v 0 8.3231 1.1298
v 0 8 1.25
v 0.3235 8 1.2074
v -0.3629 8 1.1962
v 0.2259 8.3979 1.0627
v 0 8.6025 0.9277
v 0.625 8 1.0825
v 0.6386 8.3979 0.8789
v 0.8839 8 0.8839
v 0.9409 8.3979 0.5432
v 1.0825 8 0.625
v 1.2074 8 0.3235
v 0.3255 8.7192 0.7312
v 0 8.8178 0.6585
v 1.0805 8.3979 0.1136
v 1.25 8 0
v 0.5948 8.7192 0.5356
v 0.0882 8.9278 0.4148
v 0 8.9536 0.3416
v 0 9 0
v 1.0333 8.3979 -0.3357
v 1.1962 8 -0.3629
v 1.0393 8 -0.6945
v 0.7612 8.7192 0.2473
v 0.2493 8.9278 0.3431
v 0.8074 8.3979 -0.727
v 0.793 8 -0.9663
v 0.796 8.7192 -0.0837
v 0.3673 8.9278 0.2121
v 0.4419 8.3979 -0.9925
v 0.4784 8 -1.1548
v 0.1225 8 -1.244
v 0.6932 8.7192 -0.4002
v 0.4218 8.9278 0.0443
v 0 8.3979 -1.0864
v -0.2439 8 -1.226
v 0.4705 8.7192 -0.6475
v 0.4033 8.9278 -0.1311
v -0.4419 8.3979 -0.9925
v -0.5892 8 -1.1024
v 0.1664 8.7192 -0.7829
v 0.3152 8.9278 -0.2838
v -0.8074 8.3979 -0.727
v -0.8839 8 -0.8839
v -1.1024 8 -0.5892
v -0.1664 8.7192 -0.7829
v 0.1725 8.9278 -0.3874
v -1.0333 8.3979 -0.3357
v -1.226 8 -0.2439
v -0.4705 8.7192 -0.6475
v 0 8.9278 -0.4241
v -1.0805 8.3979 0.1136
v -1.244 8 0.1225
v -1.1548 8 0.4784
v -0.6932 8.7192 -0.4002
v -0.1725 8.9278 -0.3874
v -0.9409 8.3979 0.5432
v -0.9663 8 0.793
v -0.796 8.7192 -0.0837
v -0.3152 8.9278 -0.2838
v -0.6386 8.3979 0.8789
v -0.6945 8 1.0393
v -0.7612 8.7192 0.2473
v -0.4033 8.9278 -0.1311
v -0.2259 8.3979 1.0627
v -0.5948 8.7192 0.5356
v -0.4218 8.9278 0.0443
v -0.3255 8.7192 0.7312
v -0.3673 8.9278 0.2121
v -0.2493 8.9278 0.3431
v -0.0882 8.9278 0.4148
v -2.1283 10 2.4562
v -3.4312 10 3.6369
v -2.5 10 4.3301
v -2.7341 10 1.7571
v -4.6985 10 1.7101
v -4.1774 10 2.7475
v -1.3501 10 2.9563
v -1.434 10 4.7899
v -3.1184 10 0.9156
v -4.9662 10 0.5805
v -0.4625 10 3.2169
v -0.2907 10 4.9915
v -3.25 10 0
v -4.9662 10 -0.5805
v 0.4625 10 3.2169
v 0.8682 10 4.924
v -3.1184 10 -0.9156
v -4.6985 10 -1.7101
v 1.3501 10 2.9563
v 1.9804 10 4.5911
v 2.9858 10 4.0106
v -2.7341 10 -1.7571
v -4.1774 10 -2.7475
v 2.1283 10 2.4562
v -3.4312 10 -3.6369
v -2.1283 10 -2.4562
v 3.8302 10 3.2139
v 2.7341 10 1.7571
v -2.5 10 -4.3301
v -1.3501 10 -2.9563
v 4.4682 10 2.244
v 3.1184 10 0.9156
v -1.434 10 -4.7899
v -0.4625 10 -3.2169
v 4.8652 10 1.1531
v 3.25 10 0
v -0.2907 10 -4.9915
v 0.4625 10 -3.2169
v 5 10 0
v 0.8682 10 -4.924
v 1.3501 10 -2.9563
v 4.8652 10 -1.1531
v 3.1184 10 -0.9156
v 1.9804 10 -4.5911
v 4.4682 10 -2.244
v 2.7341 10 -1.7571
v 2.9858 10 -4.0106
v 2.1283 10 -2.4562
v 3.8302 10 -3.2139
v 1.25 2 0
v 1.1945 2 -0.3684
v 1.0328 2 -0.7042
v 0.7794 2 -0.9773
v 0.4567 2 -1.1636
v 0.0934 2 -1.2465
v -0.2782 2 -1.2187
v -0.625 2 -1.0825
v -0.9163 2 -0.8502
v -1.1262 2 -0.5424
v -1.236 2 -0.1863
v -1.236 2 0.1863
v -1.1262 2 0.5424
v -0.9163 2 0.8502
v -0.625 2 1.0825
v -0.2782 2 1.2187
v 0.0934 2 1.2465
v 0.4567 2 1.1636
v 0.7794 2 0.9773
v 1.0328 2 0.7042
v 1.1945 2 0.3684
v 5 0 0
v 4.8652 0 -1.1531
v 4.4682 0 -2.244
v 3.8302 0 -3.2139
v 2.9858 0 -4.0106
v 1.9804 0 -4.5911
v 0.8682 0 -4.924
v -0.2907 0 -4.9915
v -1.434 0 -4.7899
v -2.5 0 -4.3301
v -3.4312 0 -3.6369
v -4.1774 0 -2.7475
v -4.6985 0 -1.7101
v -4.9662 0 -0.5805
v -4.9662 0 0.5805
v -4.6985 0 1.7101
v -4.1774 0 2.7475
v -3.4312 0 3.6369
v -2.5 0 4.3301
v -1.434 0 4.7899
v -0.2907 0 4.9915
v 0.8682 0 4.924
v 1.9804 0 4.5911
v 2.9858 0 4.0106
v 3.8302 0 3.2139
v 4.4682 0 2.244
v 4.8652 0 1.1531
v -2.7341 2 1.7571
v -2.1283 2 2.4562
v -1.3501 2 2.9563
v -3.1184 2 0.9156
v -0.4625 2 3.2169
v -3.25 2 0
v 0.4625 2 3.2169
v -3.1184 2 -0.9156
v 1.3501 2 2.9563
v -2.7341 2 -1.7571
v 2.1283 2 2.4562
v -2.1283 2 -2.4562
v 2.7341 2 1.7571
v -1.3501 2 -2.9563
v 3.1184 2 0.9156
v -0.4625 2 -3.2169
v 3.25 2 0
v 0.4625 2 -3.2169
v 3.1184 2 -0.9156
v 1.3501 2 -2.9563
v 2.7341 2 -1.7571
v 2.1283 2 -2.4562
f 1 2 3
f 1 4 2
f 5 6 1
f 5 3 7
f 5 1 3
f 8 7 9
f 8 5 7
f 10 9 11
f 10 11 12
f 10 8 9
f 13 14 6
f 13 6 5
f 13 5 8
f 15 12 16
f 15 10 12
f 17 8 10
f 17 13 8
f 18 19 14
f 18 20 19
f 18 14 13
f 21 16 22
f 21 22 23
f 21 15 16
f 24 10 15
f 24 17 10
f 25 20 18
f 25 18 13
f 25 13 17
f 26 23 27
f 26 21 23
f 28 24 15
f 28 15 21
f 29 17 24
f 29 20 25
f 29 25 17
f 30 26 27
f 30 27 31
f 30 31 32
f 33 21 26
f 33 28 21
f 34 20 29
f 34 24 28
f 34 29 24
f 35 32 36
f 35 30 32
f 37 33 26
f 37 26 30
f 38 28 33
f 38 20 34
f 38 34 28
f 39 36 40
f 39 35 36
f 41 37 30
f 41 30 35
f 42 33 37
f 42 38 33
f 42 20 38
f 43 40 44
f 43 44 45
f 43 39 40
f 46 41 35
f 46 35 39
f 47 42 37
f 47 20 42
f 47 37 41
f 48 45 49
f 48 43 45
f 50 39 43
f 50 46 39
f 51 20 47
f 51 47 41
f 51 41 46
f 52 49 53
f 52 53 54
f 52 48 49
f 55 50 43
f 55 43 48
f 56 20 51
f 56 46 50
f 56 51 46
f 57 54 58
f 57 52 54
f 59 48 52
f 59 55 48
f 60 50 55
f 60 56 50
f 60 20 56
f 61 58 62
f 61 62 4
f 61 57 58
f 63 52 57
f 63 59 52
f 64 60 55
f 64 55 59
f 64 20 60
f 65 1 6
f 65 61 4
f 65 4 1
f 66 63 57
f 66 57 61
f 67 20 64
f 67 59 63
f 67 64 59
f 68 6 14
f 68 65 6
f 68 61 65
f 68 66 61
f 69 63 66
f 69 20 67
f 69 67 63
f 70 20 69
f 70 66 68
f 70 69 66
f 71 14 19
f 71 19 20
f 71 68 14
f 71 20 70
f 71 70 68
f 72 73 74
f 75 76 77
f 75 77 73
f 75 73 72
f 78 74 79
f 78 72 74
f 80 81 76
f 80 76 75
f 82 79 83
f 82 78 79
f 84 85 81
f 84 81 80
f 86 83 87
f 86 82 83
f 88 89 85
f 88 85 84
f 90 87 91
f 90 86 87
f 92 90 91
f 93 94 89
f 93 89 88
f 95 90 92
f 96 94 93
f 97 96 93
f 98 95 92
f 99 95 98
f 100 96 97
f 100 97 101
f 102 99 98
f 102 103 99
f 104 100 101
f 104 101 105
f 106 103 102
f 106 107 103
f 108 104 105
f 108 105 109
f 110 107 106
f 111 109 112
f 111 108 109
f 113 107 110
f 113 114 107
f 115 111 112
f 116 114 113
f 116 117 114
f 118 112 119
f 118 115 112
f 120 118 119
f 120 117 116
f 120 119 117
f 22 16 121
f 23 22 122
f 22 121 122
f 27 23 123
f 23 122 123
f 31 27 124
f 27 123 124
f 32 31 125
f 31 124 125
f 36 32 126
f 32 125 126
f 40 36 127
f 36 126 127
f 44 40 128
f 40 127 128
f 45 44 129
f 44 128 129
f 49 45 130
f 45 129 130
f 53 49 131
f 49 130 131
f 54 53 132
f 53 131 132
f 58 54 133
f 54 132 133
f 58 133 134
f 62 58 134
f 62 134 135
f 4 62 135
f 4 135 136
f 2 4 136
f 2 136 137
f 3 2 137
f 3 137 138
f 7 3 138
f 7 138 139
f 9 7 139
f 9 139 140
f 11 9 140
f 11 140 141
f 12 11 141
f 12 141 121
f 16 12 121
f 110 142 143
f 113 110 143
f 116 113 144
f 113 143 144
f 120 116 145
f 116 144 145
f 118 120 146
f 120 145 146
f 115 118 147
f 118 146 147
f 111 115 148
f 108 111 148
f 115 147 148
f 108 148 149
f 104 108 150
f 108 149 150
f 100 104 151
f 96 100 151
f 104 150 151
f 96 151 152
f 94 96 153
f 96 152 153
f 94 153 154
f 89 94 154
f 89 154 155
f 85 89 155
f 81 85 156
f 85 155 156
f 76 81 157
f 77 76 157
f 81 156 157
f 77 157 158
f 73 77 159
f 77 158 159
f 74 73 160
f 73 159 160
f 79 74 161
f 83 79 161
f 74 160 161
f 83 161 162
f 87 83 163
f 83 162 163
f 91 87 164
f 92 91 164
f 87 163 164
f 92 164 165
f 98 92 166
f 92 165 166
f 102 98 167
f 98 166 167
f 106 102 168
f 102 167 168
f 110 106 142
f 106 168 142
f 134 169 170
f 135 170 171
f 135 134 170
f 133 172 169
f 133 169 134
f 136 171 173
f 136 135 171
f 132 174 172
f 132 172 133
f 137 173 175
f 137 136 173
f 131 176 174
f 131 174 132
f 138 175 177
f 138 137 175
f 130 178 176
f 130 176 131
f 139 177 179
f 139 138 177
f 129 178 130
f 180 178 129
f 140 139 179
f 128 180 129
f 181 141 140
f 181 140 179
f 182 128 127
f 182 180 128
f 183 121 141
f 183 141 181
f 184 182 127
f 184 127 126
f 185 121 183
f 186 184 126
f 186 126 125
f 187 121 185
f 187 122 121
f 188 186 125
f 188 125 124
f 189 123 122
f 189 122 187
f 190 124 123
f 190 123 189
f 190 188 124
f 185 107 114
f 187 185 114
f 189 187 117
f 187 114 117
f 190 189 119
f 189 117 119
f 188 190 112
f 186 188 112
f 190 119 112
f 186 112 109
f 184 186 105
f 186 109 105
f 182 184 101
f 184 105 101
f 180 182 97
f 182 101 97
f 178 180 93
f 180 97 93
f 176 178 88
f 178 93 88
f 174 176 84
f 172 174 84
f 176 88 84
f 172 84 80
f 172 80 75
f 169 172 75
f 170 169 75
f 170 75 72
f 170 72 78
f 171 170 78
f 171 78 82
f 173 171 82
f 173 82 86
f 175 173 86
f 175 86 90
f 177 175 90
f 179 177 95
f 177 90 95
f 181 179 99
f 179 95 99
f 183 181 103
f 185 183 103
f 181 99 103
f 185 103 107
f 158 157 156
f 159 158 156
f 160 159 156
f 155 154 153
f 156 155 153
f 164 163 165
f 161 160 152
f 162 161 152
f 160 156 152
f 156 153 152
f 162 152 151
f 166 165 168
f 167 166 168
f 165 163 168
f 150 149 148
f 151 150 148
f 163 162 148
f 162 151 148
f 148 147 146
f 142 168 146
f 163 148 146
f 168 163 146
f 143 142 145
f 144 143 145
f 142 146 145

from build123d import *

# Parameters (mm, degrees)
SKETCH1_R           = 5
BOSS_EXTRUDE1_DEPTH = 10
SKETCH2_R           = 3.25
CUT_EXTRUDE1_DEPTH  = 8
SKETCH3_R           = 1.25
BOSS_EXTRUDE2_DEPTH = 6
DOME1_FACE_RADIUS   = 1.25
DOME1_HEIGHT        = 1


with BuildPart() as part:
    # Sketch1 → Boss-Extrude1 (new body)
    with BuildSketch(Plane(origin=(0, 0, 0), x_dir=(1, 0, 0), z_dir=(0, 1, 0))):
        Circle(SKETCH1_R)
    extrude(amount=BOSS_EXTRUDE1_DEPTH)

    # Sketch2 → Cut-Extrude1 (cut)
    with BuildSketch(Plane(origin=(0, 10, 0), x_dir=(1, 0, 0), z_dir=(0, 1, 0))):
        Circle(SKETCH2_R)
    extrude(amount=-CUT_EXTRUDE1_DEPTH, mode=Mode.SUBTRACT)

    # Sketch3 → Boss-Extrude2 (add)
    with BuildSketch(Plane(origin=(0, 2, 0), x_dir=(1, 0, 0), z_dir=(0, 1, 0))):
        Circle(SKETCH3_R)
    extrude(amount=BOSS_EXTRUDE2_DEPTH)

    # Dome1: a dome of height H over a round flat face of radius A is a cap of a sphere of radius (A * A + H * H) / (2 * H)
    dome1_r = (DOME1_FACE_RADIUS * DOME1_FACE_RADIUS + DOME1_HEIGHT * DOME1_HEIGHT) / (2 * DOME1_HEIGHT)
    dome1_base = Plane((0, 8, 0), z_dir=(0, 1, 0))
    with Locations(dome1_base.offset(DOME1_HEIGHT - dome1_r)):
        dome1_ball = Sphere(dome1_r, mode=Mode.PRIVATE)
    add(split(dome1_ball, bisect_by=dome1_base, keep=Keep.TOP, mode=Mode.PRIVATE))


solid = part.part
